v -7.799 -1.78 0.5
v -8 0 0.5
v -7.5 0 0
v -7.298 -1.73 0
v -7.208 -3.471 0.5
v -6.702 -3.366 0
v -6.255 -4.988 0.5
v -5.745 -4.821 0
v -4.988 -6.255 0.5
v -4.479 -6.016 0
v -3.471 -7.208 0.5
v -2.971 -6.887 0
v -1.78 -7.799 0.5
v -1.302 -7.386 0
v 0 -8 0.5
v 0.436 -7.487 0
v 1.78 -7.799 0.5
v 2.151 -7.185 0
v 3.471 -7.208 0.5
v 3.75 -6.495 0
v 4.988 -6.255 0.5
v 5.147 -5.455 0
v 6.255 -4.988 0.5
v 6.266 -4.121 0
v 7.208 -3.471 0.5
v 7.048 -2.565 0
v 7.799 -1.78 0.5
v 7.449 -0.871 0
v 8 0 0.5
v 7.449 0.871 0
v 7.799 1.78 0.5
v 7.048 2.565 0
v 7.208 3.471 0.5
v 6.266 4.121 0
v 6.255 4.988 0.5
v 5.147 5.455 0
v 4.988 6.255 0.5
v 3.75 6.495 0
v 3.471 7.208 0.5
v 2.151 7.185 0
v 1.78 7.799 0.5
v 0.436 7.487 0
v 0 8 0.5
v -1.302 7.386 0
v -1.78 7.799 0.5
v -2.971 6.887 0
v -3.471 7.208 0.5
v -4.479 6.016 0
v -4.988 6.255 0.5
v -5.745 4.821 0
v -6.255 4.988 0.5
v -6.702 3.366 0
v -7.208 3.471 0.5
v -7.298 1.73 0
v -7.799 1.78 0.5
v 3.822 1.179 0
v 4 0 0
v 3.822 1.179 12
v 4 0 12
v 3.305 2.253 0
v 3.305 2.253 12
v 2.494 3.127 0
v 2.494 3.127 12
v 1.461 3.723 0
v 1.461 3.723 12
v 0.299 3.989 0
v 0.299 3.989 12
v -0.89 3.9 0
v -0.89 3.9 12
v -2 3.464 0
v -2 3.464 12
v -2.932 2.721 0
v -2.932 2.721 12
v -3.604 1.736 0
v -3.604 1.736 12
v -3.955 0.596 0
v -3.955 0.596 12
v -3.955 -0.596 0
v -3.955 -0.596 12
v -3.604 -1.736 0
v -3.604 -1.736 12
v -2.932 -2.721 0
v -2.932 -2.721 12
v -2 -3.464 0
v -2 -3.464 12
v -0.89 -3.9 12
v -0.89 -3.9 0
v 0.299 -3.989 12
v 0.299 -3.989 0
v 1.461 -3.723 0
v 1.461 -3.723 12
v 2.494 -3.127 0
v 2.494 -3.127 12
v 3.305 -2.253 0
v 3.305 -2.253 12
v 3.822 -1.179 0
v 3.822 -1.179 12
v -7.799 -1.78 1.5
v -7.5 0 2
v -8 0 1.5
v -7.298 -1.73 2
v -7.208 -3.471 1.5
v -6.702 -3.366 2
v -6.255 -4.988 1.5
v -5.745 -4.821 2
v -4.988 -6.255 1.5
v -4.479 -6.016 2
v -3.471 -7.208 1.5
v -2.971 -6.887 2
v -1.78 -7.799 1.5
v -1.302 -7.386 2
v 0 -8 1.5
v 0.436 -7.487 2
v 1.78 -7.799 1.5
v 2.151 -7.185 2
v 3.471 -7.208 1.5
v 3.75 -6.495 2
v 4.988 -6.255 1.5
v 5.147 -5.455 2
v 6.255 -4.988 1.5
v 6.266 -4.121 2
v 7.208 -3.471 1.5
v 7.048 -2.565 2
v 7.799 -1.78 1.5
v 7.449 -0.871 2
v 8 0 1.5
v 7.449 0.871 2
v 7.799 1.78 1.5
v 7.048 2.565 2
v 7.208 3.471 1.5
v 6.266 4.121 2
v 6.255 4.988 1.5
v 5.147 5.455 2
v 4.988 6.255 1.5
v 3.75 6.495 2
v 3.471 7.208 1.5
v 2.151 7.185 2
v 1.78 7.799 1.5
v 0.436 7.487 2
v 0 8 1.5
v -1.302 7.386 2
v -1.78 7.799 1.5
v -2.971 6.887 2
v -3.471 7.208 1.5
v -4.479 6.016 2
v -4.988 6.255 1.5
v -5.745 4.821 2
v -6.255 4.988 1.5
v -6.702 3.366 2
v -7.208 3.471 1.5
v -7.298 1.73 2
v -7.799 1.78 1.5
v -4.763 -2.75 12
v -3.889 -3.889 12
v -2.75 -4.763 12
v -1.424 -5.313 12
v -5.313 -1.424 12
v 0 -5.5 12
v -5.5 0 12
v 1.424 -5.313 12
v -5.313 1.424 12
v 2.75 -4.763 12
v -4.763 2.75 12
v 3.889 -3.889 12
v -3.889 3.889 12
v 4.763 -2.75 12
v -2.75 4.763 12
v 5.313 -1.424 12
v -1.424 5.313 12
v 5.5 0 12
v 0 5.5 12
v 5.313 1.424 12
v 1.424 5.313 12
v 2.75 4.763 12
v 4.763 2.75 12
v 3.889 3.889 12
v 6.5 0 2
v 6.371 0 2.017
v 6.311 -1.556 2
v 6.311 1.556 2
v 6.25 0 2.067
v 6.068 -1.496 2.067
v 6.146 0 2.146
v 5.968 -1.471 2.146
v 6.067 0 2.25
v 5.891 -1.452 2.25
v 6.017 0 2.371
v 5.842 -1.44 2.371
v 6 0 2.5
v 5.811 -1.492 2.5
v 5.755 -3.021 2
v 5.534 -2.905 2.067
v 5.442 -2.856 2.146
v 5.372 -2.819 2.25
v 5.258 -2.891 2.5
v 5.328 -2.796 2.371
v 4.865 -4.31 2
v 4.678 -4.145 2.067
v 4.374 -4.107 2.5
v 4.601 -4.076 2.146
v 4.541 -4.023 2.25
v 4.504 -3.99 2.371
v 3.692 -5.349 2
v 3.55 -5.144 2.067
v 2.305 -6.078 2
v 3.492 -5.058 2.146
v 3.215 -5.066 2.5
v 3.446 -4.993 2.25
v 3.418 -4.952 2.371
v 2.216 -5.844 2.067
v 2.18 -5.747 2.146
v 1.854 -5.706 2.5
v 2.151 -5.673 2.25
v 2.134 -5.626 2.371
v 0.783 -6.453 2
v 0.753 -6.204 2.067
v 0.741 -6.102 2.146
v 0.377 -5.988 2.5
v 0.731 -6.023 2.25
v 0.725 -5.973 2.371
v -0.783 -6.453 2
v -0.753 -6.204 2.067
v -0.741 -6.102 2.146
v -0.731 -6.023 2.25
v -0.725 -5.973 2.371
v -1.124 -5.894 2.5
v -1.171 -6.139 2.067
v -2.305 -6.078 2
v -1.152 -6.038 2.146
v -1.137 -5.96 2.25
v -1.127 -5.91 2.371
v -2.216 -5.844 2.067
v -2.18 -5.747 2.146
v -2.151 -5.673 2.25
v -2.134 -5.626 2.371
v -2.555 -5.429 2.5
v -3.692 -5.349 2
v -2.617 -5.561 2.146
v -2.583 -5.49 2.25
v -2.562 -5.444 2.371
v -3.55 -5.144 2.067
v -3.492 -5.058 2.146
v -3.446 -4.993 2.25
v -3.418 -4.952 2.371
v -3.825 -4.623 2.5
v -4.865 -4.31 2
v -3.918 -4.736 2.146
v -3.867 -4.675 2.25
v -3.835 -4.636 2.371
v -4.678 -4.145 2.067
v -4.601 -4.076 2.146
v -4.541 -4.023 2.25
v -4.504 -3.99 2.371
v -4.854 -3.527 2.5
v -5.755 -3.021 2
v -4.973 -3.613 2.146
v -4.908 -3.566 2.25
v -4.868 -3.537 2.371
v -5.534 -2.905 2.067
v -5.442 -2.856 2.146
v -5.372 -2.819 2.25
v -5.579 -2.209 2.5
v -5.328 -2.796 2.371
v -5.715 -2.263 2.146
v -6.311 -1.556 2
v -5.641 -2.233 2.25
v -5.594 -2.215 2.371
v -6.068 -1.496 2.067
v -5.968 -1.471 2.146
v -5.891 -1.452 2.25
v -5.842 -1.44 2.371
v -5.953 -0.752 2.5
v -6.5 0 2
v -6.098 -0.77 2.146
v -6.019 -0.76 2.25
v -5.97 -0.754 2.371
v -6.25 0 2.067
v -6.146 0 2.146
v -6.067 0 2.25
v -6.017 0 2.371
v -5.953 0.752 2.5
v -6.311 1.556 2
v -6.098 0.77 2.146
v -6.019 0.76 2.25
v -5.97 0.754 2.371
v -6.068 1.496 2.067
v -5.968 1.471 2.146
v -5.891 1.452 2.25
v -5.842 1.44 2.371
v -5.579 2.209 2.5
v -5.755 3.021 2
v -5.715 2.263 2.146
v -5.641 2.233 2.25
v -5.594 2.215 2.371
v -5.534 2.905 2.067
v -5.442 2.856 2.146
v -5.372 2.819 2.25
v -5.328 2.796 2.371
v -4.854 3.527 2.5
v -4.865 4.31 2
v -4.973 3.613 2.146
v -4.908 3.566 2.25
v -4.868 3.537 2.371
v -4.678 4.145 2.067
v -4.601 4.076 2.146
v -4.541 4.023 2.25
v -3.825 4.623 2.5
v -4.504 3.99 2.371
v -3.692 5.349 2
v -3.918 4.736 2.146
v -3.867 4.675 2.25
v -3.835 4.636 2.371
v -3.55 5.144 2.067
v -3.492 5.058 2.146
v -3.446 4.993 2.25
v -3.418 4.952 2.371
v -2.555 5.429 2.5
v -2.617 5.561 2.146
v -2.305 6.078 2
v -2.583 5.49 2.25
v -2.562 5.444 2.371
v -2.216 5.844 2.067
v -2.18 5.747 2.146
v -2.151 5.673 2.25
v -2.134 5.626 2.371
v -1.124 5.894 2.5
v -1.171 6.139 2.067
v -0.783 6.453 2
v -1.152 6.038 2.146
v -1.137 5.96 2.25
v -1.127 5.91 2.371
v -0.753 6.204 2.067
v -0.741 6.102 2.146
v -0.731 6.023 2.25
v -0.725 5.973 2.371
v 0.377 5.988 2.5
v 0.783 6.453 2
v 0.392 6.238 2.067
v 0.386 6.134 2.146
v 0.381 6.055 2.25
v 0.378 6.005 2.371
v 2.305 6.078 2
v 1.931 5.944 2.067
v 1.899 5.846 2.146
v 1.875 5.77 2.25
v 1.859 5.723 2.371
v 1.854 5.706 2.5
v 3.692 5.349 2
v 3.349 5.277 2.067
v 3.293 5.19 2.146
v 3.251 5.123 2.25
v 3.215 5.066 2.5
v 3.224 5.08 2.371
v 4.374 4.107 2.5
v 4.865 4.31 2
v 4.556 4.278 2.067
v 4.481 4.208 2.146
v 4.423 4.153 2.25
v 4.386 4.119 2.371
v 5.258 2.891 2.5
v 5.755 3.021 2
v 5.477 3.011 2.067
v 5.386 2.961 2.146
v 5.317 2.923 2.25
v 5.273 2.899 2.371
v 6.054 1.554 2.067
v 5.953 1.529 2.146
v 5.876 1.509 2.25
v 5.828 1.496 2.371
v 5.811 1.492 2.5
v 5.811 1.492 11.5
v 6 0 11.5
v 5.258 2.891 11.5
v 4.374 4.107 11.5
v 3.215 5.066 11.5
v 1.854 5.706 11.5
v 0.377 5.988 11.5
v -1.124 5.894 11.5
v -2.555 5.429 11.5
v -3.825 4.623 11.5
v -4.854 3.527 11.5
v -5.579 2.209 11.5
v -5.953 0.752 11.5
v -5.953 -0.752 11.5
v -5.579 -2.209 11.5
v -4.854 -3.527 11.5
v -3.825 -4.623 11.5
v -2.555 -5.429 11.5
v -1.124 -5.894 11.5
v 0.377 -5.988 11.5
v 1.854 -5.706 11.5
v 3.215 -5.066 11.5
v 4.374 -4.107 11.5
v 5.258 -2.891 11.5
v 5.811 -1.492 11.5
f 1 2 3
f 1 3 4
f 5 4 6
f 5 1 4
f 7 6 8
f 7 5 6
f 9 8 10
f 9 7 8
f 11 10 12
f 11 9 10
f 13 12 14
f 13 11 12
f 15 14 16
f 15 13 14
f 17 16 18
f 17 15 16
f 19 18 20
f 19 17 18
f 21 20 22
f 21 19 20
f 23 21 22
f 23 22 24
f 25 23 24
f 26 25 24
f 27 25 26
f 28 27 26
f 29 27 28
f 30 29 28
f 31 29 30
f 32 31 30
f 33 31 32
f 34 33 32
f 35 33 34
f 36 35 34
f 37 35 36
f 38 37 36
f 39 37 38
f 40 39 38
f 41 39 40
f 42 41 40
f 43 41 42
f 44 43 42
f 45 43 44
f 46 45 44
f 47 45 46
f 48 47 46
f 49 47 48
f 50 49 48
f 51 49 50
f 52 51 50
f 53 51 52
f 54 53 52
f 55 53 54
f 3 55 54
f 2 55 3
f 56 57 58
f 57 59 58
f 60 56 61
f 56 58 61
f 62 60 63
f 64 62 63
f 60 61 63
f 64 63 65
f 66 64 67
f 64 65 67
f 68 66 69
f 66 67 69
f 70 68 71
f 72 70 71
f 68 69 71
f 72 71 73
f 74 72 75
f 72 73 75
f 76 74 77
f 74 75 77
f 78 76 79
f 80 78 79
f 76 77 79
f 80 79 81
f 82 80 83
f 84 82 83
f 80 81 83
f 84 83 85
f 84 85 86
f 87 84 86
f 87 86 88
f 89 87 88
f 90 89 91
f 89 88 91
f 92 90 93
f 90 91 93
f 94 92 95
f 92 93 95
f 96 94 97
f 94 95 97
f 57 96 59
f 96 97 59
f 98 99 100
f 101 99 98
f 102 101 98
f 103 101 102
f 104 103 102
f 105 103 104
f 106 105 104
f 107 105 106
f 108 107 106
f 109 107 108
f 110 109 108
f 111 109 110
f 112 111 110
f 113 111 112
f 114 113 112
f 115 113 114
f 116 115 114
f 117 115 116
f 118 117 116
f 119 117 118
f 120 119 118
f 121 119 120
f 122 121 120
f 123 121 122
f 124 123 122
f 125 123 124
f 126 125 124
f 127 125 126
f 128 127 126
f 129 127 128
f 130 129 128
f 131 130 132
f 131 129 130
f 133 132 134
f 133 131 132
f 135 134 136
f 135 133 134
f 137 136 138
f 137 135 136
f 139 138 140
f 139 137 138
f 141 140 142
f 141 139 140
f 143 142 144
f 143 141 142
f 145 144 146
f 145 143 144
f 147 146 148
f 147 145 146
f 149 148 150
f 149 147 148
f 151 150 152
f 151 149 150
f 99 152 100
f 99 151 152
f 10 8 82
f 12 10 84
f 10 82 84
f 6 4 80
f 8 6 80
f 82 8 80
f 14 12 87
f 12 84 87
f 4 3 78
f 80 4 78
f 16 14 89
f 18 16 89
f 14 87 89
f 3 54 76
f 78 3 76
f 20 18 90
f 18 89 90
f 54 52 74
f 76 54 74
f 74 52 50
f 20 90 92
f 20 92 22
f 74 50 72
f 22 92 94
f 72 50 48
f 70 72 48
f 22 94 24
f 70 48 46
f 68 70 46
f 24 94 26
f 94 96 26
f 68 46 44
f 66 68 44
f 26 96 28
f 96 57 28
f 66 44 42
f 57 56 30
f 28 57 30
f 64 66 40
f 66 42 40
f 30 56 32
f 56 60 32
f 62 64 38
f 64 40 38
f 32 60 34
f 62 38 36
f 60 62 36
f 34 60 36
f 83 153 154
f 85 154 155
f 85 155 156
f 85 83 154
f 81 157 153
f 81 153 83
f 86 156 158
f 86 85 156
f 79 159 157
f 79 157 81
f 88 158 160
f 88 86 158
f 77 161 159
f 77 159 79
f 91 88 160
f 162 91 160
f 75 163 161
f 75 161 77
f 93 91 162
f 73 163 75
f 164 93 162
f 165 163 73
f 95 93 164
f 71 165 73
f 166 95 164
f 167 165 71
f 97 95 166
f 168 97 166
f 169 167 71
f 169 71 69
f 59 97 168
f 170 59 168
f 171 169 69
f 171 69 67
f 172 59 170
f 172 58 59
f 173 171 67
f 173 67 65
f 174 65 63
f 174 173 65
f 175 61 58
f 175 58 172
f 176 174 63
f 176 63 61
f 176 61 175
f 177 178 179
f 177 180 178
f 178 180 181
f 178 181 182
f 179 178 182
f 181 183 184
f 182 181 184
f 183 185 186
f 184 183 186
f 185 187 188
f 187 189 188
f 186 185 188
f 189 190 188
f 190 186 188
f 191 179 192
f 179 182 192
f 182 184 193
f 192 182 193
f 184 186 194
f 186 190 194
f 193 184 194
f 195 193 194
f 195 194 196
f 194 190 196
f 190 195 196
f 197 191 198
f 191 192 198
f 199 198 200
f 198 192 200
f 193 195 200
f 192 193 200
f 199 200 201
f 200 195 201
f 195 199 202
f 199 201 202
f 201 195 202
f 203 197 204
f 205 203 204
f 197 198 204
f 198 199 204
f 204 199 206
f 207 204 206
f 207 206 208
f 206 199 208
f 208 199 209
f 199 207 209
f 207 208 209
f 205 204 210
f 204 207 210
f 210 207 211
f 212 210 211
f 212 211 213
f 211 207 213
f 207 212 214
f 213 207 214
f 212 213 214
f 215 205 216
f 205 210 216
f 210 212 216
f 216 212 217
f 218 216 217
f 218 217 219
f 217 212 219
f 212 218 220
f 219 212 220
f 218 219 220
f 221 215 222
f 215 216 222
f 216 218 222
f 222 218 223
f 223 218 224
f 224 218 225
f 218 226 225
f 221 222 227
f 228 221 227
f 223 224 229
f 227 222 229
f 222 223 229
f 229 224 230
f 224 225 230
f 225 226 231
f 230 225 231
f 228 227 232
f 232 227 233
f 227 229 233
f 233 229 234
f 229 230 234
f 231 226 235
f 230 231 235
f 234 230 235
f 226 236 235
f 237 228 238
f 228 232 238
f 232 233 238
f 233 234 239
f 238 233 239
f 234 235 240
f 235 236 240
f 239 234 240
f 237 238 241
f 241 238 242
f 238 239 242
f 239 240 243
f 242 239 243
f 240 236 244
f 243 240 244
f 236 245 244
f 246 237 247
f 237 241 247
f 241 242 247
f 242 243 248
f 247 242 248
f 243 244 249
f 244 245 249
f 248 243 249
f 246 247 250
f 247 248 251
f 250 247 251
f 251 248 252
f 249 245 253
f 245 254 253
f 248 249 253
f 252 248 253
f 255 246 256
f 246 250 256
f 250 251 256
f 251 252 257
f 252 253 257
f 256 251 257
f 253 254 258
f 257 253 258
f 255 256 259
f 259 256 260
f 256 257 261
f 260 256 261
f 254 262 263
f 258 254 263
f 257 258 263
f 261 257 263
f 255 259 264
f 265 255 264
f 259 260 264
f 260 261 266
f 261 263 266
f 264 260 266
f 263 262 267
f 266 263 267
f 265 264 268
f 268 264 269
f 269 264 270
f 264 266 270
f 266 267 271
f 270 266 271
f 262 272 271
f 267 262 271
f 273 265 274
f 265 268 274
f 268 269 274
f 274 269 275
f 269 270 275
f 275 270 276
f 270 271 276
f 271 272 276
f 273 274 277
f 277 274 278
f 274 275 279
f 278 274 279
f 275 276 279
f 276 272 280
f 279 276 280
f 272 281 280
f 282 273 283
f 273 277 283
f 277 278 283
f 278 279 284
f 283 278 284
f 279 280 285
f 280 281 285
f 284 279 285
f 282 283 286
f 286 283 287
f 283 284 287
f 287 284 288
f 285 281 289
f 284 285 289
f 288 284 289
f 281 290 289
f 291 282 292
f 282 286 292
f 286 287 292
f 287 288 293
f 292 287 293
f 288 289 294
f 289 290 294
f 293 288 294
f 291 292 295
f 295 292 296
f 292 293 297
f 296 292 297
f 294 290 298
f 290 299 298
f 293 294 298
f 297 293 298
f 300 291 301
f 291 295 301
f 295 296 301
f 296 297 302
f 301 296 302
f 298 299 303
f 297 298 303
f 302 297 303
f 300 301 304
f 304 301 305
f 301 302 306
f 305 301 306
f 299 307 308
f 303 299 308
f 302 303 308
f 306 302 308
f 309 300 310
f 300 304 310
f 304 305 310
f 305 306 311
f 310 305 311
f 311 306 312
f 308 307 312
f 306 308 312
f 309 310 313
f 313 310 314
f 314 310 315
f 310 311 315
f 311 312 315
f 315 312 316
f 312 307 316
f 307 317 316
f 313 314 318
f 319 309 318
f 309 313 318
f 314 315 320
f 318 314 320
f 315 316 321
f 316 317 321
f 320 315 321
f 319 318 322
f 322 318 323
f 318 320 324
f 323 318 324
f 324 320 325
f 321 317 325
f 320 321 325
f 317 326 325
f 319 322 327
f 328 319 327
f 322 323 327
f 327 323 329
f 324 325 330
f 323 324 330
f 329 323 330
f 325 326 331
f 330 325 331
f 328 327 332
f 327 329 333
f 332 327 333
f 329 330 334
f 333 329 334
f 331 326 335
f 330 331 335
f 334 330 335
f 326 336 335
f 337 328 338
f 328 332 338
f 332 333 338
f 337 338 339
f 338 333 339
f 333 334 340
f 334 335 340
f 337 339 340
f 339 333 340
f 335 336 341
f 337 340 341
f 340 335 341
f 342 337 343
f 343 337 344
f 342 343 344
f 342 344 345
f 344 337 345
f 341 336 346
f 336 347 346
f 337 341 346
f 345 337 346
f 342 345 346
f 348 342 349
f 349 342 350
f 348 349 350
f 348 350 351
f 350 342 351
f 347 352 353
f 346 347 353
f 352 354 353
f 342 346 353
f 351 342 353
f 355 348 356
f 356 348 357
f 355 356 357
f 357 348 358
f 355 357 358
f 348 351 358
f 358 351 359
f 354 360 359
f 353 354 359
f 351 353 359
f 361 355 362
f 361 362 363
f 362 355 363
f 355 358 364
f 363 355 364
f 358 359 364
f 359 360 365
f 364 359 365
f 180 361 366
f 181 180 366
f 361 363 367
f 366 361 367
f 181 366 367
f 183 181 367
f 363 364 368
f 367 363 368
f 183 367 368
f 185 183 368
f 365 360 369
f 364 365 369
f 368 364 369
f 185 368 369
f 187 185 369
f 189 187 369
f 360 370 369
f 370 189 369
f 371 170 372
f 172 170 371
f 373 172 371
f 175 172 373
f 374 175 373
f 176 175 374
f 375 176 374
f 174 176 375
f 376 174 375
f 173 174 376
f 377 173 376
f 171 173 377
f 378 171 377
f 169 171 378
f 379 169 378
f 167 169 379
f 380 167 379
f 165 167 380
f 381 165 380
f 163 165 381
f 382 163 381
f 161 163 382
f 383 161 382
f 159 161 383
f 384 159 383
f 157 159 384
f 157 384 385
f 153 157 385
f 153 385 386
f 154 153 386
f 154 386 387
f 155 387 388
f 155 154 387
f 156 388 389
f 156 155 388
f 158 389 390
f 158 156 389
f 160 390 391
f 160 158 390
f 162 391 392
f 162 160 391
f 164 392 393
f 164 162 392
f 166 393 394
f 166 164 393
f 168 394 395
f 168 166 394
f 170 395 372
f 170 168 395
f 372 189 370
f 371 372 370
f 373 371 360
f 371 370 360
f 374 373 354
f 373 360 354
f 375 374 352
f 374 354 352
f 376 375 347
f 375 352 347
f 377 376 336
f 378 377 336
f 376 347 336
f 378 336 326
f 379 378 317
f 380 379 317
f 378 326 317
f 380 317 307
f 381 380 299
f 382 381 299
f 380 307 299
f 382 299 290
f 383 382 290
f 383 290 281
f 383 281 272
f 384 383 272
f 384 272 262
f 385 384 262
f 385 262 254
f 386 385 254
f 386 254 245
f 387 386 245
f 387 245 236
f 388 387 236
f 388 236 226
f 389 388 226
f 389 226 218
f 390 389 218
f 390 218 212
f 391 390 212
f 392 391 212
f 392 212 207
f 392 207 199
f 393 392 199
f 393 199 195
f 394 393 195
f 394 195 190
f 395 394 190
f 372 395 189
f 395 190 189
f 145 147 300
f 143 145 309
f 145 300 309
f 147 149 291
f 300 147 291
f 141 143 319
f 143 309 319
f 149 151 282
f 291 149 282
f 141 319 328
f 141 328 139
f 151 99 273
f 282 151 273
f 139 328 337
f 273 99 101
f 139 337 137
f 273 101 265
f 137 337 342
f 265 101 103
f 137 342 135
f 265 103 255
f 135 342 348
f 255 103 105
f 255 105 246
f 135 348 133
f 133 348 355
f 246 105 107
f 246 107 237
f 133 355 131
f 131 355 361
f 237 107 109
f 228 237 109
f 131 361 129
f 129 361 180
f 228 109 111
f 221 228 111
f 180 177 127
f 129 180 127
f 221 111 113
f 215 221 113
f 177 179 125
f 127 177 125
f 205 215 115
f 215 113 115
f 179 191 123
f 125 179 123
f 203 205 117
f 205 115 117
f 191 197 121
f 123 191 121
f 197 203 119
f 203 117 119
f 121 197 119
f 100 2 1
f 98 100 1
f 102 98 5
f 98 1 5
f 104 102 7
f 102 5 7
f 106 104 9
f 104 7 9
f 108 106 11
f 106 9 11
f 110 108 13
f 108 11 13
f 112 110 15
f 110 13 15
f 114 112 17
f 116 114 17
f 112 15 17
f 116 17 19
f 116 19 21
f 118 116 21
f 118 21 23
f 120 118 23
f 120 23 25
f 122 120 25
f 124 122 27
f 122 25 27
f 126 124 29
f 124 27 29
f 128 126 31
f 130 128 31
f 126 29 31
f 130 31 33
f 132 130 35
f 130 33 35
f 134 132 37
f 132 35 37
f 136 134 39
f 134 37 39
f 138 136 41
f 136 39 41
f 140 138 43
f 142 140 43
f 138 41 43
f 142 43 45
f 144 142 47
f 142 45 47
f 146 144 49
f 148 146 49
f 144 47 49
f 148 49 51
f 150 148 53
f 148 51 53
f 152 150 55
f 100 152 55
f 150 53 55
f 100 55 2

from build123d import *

# Parameters (mm, degrees)
ESQUISSE1_R      = 6
EXTRUSION1_DEPTH = 12
ESQUISSE2_R      = 4
EXTRUSION2_DEPTH = 15.696938457
ESQUISSE3_W      = 4
ESQUISSE3_H      = 2
CHANFREIN1_SIZE  = 0.5
CONG_1_R         = 0.5


with BuildPart() as part:
    # Esquisse1 → Extrusion1 (new body)
    with BuildSketch(Plane.XY):
        Circle(ESQUISSE1_R)
    extrude(amount=EXTRUSION1_DEPTH)

    # Esquisse2 → Extrusion2 (cut, through all)
    with BuildSketch(Plane.XY.offset(12)):
        Circle(ESQUISSE2_R)
    extrude(amount=-EXTRUSION2_DEPTH, mode=Mode.SUBTRACT)

    # Esquisse3 → Révolution2 (revolve)
    with BuildSketch(Plane(origin=(0, 0, 0), x_dir=(1, 0, 0), z_dir=(0, 1, 0)), mode=Mode.PRIVATE) as r_volution2_sk:
        with Locations((6, -1)):
            Rectangle(ESQUISSE3_W, ESQUISSE3_H)
    revolve(r_volution2_sk.sketch.rotate(Axis((0, 0, -1.456374096), (0, 0, 1)), 180), axis=Axis((0, 0, -1.456374096), (0, 0, 1)))

    # Chanfrein1
    chanfrein1_edges = [part.edges().sort_by_distance(p)[0] for p in [
        (8, 0, 0),
        (8, 0, 2),
        (-6, 0, 12),
    ]]
    chamfer(chanfrein1_edges, length=CHANFREIN1_SIZE)

    # Congé1
    cong_1_edges = [part.edges().sort_by_distance(p)[0] for p in [
        (-6, 0, 2),
    ]]
    fillet(cong_1_edges, radius=CONG_1_R)


solid = part.part
